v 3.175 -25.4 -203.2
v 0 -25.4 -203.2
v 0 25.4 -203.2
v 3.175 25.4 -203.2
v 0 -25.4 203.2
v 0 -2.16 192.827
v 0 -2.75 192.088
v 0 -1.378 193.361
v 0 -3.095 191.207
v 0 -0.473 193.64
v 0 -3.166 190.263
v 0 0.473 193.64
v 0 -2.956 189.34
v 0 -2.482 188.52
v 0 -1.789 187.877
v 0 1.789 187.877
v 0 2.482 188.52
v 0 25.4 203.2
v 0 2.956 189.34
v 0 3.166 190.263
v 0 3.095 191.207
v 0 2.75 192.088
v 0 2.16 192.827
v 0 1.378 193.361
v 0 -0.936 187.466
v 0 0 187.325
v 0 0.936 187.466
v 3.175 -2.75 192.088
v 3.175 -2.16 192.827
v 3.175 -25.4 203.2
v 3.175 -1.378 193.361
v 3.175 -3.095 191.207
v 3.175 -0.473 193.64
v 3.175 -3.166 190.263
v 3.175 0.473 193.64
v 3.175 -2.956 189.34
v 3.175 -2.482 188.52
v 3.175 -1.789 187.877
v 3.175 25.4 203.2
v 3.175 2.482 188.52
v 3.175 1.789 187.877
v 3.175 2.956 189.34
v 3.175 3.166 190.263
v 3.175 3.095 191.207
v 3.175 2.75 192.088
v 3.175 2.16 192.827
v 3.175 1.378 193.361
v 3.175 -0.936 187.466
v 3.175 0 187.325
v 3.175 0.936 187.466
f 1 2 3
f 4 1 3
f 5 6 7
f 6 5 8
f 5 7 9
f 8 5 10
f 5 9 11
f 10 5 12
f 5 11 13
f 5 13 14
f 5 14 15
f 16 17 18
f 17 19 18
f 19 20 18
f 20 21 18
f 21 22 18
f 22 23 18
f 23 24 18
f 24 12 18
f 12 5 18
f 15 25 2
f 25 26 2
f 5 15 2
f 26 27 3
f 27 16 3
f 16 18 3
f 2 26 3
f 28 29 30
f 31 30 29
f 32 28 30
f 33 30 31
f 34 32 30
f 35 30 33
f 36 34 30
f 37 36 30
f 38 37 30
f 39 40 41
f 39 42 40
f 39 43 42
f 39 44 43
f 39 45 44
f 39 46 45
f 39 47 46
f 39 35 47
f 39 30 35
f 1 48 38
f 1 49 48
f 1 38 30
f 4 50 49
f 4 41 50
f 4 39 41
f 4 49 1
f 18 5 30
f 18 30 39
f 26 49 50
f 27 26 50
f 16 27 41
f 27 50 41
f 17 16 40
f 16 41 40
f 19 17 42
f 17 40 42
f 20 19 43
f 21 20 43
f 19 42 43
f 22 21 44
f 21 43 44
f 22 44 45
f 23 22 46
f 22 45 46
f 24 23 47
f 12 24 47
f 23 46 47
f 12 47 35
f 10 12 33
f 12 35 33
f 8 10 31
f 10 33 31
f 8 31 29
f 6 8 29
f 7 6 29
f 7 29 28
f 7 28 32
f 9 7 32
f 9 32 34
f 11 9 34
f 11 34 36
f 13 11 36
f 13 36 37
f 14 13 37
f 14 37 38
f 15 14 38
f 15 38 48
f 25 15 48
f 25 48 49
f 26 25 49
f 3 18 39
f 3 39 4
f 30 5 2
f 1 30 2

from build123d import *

# Parameters (mm, degrees)
SKETCH1_W           = 406.4
SKETCH1_H           = 50.8
BOSS_EXTRUDE1_DEPTH = 3.175
CUT_EXTRUDE1_REACH  = 206.806
SKETCH2_R           = 3.175


with BuildPart() as part:
    # Sketch1 → Boss-Extrude1 (new body)
    with BuildSketch(Plane(origin=(0, 0, 0), x_dir=(0, 0, -1), z_dir=(1, 0, 0))):
        Rectangle(SKETCH1_W, SKETCH1_H)
    extrude(amount=BOSS_EXTRUDE1_DEPTH)

    # Sketch2 → Cut-Extrude1 (cut, up to next)
    with BuildSketch(Plane(origin=(3.175, 0, 0), x_dir=(0, 0, -1), z_dir=(1, 0, 0)), mode=Mode.PRIVATE) as cut_extrude1_sk1:
        with Locations((-190.5, 0)):
            Circle(SKETCH2_R)
    cut_extrude1_tool1 = extrude(cut_extrude1_sk1.sketch, amount=-CUT_EXTRUDE1_REACH, mode=Mode.PRIVATE) & part.part
    add(cut_extrude1_tool1.solids().sort_by_distance((3.175, 0, 190.5))[0], mode=Mode.SUBTRACT)


solid = part.part
